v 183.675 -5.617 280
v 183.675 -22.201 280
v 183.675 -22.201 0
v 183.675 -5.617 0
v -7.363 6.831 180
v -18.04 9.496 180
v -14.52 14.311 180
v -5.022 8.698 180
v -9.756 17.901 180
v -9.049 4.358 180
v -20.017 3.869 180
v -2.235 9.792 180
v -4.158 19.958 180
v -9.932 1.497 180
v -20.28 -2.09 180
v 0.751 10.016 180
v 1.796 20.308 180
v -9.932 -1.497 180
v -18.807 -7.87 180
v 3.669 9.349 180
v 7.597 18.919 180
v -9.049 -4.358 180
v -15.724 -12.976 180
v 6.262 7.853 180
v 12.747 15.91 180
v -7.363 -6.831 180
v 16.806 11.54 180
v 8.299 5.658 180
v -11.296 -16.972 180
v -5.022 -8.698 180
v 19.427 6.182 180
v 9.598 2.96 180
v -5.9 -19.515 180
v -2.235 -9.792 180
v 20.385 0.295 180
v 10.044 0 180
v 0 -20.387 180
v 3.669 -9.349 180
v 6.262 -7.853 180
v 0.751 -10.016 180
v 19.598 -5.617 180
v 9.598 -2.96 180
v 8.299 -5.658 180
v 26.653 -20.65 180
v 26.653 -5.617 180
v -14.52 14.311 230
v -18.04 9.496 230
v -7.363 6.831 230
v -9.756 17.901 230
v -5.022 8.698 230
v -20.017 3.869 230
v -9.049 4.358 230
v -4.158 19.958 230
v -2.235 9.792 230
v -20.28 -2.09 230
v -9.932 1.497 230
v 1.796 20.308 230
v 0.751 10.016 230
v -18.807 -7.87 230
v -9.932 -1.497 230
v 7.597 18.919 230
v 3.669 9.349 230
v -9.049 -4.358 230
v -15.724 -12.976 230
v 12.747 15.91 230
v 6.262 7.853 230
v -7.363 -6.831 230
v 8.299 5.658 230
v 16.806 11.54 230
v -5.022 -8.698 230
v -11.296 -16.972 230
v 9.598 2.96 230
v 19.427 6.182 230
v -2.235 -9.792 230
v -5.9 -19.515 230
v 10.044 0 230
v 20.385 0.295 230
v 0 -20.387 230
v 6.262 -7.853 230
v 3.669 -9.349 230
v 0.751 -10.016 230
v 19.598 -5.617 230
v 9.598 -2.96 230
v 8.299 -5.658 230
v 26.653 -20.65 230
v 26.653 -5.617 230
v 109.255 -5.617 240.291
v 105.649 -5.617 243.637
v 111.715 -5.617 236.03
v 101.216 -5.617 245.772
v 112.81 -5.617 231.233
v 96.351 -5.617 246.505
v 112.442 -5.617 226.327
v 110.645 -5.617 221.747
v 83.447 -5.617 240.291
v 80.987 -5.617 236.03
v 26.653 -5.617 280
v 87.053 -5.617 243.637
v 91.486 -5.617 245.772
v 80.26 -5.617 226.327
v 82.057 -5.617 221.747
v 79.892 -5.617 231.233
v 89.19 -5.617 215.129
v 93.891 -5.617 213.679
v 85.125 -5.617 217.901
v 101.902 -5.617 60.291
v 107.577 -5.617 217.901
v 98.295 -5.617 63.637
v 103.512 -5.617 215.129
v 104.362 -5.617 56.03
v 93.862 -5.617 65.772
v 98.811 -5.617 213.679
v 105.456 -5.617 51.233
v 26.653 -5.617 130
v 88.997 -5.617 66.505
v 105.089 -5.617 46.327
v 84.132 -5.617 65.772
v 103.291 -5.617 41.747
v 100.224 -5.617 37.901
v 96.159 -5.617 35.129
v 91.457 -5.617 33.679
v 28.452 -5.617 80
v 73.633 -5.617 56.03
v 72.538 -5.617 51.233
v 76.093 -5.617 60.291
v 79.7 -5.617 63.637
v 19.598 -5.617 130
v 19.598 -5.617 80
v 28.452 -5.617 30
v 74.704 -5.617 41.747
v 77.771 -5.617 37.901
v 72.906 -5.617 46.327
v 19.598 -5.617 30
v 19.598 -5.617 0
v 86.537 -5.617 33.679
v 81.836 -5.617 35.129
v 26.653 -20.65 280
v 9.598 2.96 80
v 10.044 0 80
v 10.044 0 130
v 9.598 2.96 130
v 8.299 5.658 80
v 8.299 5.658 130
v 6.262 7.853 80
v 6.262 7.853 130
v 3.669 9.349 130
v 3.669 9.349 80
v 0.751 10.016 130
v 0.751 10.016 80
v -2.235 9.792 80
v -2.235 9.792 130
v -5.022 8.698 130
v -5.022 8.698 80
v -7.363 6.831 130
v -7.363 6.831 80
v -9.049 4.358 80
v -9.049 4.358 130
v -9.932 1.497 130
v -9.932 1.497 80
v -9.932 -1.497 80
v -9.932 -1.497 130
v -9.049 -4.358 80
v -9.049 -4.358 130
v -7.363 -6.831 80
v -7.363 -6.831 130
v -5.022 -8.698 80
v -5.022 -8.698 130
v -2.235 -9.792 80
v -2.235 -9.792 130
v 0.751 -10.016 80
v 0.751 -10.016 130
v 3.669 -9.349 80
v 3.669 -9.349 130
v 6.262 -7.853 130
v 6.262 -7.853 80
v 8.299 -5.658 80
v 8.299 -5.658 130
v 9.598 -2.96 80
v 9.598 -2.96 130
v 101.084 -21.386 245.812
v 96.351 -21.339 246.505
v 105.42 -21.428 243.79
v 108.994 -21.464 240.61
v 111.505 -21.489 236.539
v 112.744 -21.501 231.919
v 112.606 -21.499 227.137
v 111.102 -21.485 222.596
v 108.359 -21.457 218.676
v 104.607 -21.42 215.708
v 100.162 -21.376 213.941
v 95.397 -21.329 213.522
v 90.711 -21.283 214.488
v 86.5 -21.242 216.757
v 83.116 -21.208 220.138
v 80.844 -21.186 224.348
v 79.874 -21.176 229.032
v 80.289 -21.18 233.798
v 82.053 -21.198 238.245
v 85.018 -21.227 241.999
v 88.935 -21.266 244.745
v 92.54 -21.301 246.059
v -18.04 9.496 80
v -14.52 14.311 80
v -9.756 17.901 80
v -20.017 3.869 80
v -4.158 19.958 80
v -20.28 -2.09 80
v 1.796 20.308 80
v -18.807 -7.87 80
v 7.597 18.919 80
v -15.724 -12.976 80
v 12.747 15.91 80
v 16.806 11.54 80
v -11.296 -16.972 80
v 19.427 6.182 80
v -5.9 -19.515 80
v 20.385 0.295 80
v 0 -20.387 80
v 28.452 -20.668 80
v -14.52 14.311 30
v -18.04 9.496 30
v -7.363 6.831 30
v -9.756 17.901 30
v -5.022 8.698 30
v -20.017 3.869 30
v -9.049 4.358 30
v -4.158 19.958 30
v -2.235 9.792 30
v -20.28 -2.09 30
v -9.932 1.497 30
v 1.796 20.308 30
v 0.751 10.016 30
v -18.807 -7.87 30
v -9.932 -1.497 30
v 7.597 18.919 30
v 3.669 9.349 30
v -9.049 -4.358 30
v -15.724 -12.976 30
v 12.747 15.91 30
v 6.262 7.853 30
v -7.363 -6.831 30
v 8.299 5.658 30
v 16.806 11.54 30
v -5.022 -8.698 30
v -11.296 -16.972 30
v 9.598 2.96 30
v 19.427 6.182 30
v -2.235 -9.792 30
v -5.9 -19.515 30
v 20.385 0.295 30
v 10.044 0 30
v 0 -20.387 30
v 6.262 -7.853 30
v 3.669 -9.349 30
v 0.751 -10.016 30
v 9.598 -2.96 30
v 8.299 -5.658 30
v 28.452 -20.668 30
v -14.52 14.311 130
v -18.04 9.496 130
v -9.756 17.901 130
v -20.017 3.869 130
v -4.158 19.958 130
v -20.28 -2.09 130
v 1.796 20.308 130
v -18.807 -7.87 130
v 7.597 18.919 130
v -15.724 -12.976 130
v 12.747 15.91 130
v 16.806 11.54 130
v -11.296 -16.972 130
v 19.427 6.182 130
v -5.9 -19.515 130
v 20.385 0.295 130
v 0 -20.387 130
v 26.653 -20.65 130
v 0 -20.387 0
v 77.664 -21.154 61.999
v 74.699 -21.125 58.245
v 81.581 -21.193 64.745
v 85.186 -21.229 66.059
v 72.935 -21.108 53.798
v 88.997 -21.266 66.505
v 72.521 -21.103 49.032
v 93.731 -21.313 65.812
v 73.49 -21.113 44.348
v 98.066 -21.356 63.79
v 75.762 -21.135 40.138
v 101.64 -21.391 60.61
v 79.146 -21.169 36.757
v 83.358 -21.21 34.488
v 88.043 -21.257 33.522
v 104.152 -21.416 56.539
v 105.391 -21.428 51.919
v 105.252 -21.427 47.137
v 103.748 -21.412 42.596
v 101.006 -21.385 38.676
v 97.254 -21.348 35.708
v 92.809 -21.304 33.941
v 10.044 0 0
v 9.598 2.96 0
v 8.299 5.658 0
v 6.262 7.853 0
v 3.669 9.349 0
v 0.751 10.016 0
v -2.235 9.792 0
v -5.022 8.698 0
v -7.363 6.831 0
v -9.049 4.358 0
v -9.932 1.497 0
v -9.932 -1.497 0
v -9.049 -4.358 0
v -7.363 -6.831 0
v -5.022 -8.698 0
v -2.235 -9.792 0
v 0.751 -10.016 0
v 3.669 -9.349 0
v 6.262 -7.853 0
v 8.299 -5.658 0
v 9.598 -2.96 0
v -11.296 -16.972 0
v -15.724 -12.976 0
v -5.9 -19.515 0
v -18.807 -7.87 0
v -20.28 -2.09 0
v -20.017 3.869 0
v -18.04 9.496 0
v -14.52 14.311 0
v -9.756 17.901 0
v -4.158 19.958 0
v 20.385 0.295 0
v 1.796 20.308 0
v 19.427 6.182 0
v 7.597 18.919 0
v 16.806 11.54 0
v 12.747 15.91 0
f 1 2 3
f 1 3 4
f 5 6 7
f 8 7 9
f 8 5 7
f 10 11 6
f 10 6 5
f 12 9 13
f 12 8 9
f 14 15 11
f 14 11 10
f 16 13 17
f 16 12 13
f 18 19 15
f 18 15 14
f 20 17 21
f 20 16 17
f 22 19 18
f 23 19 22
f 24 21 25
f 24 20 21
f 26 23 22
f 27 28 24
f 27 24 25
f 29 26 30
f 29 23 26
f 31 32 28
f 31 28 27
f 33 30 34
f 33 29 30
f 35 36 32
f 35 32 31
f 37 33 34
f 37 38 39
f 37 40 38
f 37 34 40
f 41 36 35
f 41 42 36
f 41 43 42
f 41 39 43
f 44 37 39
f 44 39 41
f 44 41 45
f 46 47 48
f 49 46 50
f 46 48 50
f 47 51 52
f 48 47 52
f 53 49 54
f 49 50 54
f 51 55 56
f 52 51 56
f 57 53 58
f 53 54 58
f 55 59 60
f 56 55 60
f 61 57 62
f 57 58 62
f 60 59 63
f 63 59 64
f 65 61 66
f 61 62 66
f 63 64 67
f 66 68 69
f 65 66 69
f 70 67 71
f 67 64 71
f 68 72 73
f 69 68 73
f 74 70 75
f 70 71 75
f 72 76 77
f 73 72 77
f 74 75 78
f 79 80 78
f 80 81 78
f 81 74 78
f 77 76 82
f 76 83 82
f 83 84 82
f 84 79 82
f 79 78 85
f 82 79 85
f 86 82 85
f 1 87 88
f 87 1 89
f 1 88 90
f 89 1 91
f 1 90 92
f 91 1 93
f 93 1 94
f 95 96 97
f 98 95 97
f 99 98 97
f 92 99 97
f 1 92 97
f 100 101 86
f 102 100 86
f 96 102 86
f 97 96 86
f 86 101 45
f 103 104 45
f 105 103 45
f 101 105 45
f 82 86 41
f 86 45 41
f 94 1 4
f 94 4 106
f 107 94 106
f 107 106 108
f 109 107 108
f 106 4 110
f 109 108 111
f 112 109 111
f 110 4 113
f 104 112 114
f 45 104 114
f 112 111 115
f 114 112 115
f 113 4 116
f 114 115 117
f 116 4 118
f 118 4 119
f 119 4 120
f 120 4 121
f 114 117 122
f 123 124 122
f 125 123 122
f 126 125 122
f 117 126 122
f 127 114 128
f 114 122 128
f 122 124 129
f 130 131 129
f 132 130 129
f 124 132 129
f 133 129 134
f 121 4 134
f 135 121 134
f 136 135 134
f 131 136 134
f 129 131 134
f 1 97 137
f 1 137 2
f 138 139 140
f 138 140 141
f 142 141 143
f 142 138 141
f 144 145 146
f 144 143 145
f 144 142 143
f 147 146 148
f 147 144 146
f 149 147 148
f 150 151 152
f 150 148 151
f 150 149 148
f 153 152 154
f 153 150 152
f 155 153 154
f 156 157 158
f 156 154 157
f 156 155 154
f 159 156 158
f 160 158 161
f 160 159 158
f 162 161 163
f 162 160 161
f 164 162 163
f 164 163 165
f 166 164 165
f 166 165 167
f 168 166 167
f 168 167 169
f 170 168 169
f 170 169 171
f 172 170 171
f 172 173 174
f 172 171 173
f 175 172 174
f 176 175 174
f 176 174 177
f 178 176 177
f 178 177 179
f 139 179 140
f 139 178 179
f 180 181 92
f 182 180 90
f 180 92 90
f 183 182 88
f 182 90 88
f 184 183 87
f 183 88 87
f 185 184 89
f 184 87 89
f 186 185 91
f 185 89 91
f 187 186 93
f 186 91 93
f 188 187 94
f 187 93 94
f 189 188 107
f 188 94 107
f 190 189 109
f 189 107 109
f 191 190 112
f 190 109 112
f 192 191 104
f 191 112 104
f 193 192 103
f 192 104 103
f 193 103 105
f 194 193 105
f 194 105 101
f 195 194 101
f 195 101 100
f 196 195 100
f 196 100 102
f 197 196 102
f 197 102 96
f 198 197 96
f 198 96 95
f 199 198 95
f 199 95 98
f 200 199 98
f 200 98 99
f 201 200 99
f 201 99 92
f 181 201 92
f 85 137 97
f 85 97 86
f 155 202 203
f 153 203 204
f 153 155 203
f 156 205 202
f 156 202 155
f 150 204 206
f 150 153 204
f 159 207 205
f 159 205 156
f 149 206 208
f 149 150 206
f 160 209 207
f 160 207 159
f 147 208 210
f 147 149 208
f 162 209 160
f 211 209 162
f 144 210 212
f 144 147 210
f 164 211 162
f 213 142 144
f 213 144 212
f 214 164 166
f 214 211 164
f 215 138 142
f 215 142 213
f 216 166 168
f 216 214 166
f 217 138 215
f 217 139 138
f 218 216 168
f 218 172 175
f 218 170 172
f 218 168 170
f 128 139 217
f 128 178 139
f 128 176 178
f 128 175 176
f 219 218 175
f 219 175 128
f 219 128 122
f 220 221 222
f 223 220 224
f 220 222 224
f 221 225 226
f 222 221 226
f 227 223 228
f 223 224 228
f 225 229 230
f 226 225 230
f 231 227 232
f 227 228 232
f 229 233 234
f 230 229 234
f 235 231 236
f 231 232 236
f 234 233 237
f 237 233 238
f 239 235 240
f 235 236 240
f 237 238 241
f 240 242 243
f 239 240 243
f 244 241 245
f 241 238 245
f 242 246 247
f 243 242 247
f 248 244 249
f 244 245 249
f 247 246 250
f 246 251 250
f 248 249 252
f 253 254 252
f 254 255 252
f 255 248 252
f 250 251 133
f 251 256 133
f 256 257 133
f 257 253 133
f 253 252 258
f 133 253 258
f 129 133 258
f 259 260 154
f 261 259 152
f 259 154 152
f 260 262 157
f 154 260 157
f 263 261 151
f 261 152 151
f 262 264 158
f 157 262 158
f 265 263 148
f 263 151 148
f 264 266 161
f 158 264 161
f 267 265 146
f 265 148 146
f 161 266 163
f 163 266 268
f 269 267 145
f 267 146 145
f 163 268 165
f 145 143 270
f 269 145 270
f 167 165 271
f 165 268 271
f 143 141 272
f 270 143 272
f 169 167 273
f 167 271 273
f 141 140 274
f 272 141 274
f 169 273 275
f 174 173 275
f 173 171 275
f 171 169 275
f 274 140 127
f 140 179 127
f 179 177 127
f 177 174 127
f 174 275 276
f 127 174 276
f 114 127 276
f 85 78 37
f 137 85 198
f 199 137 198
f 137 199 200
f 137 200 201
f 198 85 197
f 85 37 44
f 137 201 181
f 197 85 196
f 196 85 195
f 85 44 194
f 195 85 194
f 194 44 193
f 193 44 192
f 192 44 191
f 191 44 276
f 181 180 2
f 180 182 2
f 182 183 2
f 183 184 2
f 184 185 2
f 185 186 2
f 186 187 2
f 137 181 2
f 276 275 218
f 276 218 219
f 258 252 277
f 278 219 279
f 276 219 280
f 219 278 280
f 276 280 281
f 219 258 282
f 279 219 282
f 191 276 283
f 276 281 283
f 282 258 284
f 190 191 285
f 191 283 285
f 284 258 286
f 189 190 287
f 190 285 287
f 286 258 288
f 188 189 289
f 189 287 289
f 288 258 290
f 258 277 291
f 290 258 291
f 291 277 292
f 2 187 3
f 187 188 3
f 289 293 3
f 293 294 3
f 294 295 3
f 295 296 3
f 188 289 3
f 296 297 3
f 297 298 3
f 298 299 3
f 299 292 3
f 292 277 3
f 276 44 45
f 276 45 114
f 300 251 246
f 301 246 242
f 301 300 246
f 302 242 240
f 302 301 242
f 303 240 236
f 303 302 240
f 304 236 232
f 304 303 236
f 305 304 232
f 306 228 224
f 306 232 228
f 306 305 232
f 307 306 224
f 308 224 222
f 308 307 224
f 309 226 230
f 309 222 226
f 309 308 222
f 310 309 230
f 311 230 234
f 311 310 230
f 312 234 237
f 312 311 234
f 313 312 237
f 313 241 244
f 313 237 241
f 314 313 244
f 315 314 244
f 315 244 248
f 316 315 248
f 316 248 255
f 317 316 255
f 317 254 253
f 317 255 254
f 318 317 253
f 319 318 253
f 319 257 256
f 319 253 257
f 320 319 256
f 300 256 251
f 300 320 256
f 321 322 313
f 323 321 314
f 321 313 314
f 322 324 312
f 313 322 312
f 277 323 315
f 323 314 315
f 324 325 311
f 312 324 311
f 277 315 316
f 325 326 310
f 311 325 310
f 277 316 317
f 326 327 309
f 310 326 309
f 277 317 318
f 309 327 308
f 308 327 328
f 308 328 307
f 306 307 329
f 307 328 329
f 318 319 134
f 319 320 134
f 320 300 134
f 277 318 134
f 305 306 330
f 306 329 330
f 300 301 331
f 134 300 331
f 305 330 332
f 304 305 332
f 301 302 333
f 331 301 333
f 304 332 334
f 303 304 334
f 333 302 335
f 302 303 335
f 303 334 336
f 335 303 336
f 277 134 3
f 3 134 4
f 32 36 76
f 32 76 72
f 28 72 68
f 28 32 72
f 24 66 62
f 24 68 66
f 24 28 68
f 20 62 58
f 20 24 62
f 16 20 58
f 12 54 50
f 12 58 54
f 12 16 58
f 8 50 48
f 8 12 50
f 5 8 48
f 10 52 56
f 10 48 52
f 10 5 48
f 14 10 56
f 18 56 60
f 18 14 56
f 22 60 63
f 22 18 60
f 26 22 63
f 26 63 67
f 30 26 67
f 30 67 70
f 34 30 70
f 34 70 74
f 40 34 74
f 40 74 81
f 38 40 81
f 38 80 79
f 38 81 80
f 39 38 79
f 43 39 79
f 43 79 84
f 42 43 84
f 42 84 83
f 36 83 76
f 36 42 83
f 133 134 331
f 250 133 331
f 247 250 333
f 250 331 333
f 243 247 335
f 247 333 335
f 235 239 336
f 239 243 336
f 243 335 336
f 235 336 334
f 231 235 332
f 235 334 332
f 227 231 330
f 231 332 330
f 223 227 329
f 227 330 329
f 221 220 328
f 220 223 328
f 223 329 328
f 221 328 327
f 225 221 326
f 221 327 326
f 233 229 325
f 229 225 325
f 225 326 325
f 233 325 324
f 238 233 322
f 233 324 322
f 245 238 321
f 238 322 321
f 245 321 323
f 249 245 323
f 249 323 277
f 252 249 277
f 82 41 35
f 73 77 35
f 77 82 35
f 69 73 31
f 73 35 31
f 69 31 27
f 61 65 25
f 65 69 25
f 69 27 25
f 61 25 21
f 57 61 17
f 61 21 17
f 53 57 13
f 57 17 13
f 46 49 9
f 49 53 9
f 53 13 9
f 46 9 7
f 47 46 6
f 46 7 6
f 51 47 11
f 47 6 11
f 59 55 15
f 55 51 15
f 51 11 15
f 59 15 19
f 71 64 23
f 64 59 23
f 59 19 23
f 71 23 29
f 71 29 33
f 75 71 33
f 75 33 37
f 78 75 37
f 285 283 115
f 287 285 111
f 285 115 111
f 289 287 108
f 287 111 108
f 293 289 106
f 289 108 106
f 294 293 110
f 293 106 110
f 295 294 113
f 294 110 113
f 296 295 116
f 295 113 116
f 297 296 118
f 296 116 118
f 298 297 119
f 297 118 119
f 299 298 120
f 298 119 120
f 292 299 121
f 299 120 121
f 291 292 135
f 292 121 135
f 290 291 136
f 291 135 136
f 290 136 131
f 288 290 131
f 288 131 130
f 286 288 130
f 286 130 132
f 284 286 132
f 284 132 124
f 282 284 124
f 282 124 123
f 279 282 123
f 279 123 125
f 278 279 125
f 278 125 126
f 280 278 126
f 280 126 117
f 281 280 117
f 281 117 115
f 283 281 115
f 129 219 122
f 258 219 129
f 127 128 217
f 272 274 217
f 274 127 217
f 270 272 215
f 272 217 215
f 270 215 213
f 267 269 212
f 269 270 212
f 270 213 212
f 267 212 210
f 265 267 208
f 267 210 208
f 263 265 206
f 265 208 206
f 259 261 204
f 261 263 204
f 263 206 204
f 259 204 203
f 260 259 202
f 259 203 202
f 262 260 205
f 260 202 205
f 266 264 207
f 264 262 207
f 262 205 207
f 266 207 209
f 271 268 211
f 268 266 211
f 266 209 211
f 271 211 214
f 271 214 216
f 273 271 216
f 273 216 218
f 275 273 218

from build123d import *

# Parameters (mm, degrees)
SKETCH_25_R              = 10.043747569
EXTRUDE_13_DEPTH         = 280
SKETCH_26_R              = 16.505129475
CUT_EXTRUDE_3_DEPTH      = 336.875889274
CUT_EXTRUDE_4_DEPTH      = 336.875889274
CUT_EXTRUDE_4_DEPTH_BACK = 336.875889274
SKETCH_27_W              = 70.665536313
SKETCH_27_H              = 50
SKETCH_27_W_2            = 68.866777207


with BuildPart() as part:
    # 草图25 → 凸台-拉伸13 (new body)
    with BuildSketch(Plane.XY):
        with BuildLine():
            Line((0, -20.387033345), (183.674687946, -22.201454999))
            Line((183.674687946, -22.201454999), (183.674687946, -5.617235602))
            Line((183.674687946, -5.617235602), (19.597902766, -5.617235602))
            ThreePointArc((19.597902766, -5.617235602), (-12.27013364, 16.281122476), (0, -20.387033345))
        make_face()
        Circle(SKETCH_25_R, mode=Mode.SUBTRACT)
    extrude(amount=EXTRUDE_13_DEPTH)

    # 草图26 → 切除-拉伸3 (cut, through all)
    with BuildSketch(Plane(origin=(0, -5.617235602, 0), x_dir=(1, 0, 0), z_dir=(0, 1, 0))):
        with Locations(Location((88.997396182, -50, 0), (0, 0, 270))):
            Circle(SKETCH_26_R)
        with Locations(Location((96.350965064, -230, 0), (0, 0, 270))):
            Circle(SKETCH_26_R)
    extrude(amount=-CUT_EXTRUDE_3_DEPTH, mode=Mode.SUBTRACT)

    # 草图27 → 切除-拉伸4 (cut, two sides: drawn at the far end of the back side and taken through both)
    with BuildSketch(Plane(origin=(0, -5.617235602, 0), x_dir=(1, 0, 0), z_dir=(0, 1, 0)).offset(-CUT_EXTRUDE_4_DEPTH_BACK)):
        with Locations((-6.880817282, -55)):
            Rectangle(SKETCH_27_W, SKETCH_27_H)
        with Locations((-7.780196834, -155)):
            Rectangle(SKETCH_27_W_2, SKETCH_27_H)
        with Locations((-7.780196834, -255)):
            Rectangle(SKETCH_27_W_2, SKETCH_27_H)
    extrude(amount=CUT_EXTRUDE_4_DEPTH + CUT_EXTRUDE_4_DEPTH_BACK, mode=Mode.SUBTRACT)


solid = part.part
